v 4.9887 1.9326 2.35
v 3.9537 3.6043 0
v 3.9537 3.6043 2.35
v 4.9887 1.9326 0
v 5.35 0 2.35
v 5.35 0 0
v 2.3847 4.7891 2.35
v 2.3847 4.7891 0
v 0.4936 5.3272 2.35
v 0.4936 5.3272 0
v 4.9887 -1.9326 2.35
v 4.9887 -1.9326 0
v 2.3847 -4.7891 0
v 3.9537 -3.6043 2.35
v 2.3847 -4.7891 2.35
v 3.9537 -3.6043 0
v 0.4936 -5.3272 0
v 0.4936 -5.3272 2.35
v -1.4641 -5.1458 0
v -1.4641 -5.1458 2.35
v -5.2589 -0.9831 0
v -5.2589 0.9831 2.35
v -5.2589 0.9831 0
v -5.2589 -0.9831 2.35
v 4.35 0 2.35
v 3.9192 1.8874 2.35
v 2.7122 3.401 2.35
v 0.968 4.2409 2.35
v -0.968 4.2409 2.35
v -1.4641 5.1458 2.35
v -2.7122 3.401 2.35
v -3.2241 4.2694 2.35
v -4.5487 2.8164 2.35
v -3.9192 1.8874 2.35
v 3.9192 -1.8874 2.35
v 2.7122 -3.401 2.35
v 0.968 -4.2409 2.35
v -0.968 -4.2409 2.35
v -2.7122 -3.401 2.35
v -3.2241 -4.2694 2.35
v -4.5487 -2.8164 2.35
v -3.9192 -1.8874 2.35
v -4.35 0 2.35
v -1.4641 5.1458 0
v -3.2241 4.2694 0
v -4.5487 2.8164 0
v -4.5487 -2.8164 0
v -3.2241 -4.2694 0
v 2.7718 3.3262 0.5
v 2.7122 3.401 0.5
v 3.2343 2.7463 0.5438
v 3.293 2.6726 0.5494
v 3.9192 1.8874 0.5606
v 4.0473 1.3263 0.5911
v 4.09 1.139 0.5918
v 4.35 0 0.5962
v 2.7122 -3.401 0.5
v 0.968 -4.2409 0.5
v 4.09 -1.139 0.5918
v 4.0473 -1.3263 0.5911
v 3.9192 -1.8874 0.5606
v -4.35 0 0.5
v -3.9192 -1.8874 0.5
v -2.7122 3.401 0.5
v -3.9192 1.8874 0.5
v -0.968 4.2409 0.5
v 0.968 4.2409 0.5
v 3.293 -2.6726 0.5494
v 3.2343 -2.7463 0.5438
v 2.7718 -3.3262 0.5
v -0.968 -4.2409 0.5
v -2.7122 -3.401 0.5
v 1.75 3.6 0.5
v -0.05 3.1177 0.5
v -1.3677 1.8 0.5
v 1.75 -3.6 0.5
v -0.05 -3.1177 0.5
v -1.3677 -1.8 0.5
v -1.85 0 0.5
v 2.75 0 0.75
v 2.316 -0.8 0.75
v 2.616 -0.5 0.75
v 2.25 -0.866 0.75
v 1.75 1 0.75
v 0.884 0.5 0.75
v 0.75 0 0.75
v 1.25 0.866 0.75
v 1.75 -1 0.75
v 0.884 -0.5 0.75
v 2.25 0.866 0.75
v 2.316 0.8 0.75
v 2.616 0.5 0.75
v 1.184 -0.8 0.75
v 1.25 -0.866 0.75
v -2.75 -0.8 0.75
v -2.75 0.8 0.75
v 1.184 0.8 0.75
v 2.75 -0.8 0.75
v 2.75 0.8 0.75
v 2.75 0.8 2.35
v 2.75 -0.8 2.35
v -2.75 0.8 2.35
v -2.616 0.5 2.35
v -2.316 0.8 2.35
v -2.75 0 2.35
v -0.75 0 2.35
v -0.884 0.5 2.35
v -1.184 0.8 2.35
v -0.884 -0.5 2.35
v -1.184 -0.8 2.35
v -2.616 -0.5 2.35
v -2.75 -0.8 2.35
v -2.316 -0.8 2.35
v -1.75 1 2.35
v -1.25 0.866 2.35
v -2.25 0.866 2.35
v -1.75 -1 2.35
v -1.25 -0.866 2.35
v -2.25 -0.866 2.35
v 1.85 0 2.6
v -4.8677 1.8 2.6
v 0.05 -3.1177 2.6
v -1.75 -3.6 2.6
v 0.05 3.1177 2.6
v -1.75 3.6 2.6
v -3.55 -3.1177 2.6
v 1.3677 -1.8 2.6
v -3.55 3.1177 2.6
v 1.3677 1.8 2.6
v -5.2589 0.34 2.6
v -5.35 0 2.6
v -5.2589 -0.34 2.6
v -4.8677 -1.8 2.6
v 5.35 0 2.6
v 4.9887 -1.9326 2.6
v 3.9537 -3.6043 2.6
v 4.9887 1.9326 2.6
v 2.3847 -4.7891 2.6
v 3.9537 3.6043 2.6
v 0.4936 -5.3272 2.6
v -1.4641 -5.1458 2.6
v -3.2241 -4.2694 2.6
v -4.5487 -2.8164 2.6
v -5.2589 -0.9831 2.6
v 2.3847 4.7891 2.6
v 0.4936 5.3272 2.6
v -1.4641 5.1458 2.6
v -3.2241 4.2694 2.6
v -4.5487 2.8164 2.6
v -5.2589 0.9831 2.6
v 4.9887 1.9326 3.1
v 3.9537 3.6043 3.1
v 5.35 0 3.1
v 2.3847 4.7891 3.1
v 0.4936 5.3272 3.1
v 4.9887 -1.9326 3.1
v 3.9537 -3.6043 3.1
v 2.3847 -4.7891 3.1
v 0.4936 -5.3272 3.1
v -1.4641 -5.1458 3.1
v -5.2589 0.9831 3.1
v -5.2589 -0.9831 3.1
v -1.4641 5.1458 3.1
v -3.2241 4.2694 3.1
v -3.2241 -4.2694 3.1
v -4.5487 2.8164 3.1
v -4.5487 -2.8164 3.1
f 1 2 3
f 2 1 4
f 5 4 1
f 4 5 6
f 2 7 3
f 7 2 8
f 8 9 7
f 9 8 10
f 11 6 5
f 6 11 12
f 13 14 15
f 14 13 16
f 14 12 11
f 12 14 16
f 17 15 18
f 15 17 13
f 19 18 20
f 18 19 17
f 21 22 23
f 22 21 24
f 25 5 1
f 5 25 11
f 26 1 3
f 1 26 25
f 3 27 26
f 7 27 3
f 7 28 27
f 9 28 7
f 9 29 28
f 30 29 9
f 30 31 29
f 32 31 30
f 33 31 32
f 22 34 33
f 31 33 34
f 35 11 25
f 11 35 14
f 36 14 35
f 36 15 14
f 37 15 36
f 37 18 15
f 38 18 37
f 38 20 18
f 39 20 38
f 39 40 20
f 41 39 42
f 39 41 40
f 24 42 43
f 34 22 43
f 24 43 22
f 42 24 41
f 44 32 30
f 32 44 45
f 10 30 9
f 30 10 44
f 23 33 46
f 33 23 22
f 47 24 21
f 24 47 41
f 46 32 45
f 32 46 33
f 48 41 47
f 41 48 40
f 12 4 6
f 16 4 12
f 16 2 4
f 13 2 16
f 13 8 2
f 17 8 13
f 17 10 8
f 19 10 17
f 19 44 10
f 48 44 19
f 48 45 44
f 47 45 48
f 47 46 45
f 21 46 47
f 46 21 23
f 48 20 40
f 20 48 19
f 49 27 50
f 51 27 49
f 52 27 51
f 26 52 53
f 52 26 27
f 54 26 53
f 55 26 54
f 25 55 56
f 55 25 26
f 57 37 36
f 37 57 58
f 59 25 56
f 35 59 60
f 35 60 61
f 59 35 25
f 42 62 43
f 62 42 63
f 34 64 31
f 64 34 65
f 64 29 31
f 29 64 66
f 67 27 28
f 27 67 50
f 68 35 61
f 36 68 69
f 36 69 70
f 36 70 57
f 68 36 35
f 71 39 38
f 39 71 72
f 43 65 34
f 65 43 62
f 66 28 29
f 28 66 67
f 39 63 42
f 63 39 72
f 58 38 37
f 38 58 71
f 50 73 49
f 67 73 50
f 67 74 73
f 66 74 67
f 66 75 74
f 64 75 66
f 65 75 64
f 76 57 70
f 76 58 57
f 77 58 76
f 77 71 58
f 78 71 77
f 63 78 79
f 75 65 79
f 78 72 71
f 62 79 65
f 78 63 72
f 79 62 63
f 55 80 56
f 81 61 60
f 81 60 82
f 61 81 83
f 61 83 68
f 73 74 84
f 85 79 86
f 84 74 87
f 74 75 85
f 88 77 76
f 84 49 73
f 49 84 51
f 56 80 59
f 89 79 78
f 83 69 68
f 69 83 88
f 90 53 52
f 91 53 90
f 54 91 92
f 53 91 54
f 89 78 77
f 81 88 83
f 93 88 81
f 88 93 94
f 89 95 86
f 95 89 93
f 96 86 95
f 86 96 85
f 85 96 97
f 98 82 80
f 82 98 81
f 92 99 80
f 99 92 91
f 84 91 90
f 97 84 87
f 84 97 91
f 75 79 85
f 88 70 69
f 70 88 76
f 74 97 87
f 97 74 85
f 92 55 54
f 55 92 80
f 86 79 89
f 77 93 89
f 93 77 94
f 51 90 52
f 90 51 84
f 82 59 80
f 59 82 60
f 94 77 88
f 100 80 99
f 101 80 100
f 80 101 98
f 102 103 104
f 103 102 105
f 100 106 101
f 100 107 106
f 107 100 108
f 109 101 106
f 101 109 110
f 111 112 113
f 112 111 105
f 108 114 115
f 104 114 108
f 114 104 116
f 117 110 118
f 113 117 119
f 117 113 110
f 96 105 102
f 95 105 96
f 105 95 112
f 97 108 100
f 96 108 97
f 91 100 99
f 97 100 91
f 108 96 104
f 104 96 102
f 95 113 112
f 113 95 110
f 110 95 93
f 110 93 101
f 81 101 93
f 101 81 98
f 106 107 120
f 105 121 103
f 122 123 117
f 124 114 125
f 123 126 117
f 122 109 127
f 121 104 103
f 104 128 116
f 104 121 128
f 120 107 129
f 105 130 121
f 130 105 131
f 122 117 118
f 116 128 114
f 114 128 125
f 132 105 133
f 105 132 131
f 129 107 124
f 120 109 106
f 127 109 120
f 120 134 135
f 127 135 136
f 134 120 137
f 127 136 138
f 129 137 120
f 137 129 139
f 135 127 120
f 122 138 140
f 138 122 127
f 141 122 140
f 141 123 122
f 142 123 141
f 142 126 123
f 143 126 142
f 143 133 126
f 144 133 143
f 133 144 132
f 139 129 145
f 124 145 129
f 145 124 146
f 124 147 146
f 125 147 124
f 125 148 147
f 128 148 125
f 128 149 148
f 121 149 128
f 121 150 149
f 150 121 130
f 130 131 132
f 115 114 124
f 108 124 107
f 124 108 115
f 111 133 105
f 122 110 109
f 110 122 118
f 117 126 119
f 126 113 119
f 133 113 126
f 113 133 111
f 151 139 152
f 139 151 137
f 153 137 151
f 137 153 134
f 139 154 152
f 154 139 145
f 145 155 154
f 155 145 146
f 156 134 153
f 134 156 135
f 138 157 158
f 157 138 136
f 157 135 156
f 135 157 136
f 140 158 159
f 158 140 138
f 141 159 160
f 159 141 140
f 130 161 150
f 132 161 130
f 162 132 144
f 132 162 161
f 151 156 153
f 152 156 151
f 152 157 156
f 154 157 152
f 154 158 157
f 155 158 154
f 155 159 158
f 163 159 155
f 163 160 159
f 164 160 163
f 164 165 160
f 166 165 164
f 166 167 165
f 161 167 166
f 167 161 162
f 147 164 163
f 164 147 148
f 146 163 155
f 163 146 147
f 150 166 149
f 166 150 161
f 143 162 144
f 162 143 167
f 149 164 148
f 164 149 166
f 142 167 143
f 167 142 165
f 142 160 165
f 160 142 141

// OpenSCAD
module bierdeggl()
{
	// Helper for view, change to 0 when printing
	dview = 0.1;
	// Load Cell
	lch = 1.6;
	lcw = 1.6;
	lcl = 5.5;
	// Bottom
	bh = 0.5;
	bd = 10.7;
	br = bd/2;
	d = 0.25;
	cr = 1;
	

	cylinder(h = bh, d = bd, center = false);
	translate([lcl/2-cr,0,bh])
		cylinder(h = d, r1 = br-lcl/2+cr, r2 = cr, center = false);
	translate([0,0,bh+d+lch/2])
		cube(size = [lcl,lcw,lch], center = true);

	translate([-lcl/2+cr,0,bh+d+lch])
		cylinder(h = d, r2 = br-lcl/2+cr, r1 = cr, center = false);
	translate([0,0,bh+2*d+lch])
		cylinder(h = bh, d = bd, center = false);

	difference() {
  		cylinder(h = bh+d+lch, r = br);
		translate([0, 0, 0])
    		cylinder(h = bh+d+lch+dview, r = br-1);
	}
}
bierdeggl();
